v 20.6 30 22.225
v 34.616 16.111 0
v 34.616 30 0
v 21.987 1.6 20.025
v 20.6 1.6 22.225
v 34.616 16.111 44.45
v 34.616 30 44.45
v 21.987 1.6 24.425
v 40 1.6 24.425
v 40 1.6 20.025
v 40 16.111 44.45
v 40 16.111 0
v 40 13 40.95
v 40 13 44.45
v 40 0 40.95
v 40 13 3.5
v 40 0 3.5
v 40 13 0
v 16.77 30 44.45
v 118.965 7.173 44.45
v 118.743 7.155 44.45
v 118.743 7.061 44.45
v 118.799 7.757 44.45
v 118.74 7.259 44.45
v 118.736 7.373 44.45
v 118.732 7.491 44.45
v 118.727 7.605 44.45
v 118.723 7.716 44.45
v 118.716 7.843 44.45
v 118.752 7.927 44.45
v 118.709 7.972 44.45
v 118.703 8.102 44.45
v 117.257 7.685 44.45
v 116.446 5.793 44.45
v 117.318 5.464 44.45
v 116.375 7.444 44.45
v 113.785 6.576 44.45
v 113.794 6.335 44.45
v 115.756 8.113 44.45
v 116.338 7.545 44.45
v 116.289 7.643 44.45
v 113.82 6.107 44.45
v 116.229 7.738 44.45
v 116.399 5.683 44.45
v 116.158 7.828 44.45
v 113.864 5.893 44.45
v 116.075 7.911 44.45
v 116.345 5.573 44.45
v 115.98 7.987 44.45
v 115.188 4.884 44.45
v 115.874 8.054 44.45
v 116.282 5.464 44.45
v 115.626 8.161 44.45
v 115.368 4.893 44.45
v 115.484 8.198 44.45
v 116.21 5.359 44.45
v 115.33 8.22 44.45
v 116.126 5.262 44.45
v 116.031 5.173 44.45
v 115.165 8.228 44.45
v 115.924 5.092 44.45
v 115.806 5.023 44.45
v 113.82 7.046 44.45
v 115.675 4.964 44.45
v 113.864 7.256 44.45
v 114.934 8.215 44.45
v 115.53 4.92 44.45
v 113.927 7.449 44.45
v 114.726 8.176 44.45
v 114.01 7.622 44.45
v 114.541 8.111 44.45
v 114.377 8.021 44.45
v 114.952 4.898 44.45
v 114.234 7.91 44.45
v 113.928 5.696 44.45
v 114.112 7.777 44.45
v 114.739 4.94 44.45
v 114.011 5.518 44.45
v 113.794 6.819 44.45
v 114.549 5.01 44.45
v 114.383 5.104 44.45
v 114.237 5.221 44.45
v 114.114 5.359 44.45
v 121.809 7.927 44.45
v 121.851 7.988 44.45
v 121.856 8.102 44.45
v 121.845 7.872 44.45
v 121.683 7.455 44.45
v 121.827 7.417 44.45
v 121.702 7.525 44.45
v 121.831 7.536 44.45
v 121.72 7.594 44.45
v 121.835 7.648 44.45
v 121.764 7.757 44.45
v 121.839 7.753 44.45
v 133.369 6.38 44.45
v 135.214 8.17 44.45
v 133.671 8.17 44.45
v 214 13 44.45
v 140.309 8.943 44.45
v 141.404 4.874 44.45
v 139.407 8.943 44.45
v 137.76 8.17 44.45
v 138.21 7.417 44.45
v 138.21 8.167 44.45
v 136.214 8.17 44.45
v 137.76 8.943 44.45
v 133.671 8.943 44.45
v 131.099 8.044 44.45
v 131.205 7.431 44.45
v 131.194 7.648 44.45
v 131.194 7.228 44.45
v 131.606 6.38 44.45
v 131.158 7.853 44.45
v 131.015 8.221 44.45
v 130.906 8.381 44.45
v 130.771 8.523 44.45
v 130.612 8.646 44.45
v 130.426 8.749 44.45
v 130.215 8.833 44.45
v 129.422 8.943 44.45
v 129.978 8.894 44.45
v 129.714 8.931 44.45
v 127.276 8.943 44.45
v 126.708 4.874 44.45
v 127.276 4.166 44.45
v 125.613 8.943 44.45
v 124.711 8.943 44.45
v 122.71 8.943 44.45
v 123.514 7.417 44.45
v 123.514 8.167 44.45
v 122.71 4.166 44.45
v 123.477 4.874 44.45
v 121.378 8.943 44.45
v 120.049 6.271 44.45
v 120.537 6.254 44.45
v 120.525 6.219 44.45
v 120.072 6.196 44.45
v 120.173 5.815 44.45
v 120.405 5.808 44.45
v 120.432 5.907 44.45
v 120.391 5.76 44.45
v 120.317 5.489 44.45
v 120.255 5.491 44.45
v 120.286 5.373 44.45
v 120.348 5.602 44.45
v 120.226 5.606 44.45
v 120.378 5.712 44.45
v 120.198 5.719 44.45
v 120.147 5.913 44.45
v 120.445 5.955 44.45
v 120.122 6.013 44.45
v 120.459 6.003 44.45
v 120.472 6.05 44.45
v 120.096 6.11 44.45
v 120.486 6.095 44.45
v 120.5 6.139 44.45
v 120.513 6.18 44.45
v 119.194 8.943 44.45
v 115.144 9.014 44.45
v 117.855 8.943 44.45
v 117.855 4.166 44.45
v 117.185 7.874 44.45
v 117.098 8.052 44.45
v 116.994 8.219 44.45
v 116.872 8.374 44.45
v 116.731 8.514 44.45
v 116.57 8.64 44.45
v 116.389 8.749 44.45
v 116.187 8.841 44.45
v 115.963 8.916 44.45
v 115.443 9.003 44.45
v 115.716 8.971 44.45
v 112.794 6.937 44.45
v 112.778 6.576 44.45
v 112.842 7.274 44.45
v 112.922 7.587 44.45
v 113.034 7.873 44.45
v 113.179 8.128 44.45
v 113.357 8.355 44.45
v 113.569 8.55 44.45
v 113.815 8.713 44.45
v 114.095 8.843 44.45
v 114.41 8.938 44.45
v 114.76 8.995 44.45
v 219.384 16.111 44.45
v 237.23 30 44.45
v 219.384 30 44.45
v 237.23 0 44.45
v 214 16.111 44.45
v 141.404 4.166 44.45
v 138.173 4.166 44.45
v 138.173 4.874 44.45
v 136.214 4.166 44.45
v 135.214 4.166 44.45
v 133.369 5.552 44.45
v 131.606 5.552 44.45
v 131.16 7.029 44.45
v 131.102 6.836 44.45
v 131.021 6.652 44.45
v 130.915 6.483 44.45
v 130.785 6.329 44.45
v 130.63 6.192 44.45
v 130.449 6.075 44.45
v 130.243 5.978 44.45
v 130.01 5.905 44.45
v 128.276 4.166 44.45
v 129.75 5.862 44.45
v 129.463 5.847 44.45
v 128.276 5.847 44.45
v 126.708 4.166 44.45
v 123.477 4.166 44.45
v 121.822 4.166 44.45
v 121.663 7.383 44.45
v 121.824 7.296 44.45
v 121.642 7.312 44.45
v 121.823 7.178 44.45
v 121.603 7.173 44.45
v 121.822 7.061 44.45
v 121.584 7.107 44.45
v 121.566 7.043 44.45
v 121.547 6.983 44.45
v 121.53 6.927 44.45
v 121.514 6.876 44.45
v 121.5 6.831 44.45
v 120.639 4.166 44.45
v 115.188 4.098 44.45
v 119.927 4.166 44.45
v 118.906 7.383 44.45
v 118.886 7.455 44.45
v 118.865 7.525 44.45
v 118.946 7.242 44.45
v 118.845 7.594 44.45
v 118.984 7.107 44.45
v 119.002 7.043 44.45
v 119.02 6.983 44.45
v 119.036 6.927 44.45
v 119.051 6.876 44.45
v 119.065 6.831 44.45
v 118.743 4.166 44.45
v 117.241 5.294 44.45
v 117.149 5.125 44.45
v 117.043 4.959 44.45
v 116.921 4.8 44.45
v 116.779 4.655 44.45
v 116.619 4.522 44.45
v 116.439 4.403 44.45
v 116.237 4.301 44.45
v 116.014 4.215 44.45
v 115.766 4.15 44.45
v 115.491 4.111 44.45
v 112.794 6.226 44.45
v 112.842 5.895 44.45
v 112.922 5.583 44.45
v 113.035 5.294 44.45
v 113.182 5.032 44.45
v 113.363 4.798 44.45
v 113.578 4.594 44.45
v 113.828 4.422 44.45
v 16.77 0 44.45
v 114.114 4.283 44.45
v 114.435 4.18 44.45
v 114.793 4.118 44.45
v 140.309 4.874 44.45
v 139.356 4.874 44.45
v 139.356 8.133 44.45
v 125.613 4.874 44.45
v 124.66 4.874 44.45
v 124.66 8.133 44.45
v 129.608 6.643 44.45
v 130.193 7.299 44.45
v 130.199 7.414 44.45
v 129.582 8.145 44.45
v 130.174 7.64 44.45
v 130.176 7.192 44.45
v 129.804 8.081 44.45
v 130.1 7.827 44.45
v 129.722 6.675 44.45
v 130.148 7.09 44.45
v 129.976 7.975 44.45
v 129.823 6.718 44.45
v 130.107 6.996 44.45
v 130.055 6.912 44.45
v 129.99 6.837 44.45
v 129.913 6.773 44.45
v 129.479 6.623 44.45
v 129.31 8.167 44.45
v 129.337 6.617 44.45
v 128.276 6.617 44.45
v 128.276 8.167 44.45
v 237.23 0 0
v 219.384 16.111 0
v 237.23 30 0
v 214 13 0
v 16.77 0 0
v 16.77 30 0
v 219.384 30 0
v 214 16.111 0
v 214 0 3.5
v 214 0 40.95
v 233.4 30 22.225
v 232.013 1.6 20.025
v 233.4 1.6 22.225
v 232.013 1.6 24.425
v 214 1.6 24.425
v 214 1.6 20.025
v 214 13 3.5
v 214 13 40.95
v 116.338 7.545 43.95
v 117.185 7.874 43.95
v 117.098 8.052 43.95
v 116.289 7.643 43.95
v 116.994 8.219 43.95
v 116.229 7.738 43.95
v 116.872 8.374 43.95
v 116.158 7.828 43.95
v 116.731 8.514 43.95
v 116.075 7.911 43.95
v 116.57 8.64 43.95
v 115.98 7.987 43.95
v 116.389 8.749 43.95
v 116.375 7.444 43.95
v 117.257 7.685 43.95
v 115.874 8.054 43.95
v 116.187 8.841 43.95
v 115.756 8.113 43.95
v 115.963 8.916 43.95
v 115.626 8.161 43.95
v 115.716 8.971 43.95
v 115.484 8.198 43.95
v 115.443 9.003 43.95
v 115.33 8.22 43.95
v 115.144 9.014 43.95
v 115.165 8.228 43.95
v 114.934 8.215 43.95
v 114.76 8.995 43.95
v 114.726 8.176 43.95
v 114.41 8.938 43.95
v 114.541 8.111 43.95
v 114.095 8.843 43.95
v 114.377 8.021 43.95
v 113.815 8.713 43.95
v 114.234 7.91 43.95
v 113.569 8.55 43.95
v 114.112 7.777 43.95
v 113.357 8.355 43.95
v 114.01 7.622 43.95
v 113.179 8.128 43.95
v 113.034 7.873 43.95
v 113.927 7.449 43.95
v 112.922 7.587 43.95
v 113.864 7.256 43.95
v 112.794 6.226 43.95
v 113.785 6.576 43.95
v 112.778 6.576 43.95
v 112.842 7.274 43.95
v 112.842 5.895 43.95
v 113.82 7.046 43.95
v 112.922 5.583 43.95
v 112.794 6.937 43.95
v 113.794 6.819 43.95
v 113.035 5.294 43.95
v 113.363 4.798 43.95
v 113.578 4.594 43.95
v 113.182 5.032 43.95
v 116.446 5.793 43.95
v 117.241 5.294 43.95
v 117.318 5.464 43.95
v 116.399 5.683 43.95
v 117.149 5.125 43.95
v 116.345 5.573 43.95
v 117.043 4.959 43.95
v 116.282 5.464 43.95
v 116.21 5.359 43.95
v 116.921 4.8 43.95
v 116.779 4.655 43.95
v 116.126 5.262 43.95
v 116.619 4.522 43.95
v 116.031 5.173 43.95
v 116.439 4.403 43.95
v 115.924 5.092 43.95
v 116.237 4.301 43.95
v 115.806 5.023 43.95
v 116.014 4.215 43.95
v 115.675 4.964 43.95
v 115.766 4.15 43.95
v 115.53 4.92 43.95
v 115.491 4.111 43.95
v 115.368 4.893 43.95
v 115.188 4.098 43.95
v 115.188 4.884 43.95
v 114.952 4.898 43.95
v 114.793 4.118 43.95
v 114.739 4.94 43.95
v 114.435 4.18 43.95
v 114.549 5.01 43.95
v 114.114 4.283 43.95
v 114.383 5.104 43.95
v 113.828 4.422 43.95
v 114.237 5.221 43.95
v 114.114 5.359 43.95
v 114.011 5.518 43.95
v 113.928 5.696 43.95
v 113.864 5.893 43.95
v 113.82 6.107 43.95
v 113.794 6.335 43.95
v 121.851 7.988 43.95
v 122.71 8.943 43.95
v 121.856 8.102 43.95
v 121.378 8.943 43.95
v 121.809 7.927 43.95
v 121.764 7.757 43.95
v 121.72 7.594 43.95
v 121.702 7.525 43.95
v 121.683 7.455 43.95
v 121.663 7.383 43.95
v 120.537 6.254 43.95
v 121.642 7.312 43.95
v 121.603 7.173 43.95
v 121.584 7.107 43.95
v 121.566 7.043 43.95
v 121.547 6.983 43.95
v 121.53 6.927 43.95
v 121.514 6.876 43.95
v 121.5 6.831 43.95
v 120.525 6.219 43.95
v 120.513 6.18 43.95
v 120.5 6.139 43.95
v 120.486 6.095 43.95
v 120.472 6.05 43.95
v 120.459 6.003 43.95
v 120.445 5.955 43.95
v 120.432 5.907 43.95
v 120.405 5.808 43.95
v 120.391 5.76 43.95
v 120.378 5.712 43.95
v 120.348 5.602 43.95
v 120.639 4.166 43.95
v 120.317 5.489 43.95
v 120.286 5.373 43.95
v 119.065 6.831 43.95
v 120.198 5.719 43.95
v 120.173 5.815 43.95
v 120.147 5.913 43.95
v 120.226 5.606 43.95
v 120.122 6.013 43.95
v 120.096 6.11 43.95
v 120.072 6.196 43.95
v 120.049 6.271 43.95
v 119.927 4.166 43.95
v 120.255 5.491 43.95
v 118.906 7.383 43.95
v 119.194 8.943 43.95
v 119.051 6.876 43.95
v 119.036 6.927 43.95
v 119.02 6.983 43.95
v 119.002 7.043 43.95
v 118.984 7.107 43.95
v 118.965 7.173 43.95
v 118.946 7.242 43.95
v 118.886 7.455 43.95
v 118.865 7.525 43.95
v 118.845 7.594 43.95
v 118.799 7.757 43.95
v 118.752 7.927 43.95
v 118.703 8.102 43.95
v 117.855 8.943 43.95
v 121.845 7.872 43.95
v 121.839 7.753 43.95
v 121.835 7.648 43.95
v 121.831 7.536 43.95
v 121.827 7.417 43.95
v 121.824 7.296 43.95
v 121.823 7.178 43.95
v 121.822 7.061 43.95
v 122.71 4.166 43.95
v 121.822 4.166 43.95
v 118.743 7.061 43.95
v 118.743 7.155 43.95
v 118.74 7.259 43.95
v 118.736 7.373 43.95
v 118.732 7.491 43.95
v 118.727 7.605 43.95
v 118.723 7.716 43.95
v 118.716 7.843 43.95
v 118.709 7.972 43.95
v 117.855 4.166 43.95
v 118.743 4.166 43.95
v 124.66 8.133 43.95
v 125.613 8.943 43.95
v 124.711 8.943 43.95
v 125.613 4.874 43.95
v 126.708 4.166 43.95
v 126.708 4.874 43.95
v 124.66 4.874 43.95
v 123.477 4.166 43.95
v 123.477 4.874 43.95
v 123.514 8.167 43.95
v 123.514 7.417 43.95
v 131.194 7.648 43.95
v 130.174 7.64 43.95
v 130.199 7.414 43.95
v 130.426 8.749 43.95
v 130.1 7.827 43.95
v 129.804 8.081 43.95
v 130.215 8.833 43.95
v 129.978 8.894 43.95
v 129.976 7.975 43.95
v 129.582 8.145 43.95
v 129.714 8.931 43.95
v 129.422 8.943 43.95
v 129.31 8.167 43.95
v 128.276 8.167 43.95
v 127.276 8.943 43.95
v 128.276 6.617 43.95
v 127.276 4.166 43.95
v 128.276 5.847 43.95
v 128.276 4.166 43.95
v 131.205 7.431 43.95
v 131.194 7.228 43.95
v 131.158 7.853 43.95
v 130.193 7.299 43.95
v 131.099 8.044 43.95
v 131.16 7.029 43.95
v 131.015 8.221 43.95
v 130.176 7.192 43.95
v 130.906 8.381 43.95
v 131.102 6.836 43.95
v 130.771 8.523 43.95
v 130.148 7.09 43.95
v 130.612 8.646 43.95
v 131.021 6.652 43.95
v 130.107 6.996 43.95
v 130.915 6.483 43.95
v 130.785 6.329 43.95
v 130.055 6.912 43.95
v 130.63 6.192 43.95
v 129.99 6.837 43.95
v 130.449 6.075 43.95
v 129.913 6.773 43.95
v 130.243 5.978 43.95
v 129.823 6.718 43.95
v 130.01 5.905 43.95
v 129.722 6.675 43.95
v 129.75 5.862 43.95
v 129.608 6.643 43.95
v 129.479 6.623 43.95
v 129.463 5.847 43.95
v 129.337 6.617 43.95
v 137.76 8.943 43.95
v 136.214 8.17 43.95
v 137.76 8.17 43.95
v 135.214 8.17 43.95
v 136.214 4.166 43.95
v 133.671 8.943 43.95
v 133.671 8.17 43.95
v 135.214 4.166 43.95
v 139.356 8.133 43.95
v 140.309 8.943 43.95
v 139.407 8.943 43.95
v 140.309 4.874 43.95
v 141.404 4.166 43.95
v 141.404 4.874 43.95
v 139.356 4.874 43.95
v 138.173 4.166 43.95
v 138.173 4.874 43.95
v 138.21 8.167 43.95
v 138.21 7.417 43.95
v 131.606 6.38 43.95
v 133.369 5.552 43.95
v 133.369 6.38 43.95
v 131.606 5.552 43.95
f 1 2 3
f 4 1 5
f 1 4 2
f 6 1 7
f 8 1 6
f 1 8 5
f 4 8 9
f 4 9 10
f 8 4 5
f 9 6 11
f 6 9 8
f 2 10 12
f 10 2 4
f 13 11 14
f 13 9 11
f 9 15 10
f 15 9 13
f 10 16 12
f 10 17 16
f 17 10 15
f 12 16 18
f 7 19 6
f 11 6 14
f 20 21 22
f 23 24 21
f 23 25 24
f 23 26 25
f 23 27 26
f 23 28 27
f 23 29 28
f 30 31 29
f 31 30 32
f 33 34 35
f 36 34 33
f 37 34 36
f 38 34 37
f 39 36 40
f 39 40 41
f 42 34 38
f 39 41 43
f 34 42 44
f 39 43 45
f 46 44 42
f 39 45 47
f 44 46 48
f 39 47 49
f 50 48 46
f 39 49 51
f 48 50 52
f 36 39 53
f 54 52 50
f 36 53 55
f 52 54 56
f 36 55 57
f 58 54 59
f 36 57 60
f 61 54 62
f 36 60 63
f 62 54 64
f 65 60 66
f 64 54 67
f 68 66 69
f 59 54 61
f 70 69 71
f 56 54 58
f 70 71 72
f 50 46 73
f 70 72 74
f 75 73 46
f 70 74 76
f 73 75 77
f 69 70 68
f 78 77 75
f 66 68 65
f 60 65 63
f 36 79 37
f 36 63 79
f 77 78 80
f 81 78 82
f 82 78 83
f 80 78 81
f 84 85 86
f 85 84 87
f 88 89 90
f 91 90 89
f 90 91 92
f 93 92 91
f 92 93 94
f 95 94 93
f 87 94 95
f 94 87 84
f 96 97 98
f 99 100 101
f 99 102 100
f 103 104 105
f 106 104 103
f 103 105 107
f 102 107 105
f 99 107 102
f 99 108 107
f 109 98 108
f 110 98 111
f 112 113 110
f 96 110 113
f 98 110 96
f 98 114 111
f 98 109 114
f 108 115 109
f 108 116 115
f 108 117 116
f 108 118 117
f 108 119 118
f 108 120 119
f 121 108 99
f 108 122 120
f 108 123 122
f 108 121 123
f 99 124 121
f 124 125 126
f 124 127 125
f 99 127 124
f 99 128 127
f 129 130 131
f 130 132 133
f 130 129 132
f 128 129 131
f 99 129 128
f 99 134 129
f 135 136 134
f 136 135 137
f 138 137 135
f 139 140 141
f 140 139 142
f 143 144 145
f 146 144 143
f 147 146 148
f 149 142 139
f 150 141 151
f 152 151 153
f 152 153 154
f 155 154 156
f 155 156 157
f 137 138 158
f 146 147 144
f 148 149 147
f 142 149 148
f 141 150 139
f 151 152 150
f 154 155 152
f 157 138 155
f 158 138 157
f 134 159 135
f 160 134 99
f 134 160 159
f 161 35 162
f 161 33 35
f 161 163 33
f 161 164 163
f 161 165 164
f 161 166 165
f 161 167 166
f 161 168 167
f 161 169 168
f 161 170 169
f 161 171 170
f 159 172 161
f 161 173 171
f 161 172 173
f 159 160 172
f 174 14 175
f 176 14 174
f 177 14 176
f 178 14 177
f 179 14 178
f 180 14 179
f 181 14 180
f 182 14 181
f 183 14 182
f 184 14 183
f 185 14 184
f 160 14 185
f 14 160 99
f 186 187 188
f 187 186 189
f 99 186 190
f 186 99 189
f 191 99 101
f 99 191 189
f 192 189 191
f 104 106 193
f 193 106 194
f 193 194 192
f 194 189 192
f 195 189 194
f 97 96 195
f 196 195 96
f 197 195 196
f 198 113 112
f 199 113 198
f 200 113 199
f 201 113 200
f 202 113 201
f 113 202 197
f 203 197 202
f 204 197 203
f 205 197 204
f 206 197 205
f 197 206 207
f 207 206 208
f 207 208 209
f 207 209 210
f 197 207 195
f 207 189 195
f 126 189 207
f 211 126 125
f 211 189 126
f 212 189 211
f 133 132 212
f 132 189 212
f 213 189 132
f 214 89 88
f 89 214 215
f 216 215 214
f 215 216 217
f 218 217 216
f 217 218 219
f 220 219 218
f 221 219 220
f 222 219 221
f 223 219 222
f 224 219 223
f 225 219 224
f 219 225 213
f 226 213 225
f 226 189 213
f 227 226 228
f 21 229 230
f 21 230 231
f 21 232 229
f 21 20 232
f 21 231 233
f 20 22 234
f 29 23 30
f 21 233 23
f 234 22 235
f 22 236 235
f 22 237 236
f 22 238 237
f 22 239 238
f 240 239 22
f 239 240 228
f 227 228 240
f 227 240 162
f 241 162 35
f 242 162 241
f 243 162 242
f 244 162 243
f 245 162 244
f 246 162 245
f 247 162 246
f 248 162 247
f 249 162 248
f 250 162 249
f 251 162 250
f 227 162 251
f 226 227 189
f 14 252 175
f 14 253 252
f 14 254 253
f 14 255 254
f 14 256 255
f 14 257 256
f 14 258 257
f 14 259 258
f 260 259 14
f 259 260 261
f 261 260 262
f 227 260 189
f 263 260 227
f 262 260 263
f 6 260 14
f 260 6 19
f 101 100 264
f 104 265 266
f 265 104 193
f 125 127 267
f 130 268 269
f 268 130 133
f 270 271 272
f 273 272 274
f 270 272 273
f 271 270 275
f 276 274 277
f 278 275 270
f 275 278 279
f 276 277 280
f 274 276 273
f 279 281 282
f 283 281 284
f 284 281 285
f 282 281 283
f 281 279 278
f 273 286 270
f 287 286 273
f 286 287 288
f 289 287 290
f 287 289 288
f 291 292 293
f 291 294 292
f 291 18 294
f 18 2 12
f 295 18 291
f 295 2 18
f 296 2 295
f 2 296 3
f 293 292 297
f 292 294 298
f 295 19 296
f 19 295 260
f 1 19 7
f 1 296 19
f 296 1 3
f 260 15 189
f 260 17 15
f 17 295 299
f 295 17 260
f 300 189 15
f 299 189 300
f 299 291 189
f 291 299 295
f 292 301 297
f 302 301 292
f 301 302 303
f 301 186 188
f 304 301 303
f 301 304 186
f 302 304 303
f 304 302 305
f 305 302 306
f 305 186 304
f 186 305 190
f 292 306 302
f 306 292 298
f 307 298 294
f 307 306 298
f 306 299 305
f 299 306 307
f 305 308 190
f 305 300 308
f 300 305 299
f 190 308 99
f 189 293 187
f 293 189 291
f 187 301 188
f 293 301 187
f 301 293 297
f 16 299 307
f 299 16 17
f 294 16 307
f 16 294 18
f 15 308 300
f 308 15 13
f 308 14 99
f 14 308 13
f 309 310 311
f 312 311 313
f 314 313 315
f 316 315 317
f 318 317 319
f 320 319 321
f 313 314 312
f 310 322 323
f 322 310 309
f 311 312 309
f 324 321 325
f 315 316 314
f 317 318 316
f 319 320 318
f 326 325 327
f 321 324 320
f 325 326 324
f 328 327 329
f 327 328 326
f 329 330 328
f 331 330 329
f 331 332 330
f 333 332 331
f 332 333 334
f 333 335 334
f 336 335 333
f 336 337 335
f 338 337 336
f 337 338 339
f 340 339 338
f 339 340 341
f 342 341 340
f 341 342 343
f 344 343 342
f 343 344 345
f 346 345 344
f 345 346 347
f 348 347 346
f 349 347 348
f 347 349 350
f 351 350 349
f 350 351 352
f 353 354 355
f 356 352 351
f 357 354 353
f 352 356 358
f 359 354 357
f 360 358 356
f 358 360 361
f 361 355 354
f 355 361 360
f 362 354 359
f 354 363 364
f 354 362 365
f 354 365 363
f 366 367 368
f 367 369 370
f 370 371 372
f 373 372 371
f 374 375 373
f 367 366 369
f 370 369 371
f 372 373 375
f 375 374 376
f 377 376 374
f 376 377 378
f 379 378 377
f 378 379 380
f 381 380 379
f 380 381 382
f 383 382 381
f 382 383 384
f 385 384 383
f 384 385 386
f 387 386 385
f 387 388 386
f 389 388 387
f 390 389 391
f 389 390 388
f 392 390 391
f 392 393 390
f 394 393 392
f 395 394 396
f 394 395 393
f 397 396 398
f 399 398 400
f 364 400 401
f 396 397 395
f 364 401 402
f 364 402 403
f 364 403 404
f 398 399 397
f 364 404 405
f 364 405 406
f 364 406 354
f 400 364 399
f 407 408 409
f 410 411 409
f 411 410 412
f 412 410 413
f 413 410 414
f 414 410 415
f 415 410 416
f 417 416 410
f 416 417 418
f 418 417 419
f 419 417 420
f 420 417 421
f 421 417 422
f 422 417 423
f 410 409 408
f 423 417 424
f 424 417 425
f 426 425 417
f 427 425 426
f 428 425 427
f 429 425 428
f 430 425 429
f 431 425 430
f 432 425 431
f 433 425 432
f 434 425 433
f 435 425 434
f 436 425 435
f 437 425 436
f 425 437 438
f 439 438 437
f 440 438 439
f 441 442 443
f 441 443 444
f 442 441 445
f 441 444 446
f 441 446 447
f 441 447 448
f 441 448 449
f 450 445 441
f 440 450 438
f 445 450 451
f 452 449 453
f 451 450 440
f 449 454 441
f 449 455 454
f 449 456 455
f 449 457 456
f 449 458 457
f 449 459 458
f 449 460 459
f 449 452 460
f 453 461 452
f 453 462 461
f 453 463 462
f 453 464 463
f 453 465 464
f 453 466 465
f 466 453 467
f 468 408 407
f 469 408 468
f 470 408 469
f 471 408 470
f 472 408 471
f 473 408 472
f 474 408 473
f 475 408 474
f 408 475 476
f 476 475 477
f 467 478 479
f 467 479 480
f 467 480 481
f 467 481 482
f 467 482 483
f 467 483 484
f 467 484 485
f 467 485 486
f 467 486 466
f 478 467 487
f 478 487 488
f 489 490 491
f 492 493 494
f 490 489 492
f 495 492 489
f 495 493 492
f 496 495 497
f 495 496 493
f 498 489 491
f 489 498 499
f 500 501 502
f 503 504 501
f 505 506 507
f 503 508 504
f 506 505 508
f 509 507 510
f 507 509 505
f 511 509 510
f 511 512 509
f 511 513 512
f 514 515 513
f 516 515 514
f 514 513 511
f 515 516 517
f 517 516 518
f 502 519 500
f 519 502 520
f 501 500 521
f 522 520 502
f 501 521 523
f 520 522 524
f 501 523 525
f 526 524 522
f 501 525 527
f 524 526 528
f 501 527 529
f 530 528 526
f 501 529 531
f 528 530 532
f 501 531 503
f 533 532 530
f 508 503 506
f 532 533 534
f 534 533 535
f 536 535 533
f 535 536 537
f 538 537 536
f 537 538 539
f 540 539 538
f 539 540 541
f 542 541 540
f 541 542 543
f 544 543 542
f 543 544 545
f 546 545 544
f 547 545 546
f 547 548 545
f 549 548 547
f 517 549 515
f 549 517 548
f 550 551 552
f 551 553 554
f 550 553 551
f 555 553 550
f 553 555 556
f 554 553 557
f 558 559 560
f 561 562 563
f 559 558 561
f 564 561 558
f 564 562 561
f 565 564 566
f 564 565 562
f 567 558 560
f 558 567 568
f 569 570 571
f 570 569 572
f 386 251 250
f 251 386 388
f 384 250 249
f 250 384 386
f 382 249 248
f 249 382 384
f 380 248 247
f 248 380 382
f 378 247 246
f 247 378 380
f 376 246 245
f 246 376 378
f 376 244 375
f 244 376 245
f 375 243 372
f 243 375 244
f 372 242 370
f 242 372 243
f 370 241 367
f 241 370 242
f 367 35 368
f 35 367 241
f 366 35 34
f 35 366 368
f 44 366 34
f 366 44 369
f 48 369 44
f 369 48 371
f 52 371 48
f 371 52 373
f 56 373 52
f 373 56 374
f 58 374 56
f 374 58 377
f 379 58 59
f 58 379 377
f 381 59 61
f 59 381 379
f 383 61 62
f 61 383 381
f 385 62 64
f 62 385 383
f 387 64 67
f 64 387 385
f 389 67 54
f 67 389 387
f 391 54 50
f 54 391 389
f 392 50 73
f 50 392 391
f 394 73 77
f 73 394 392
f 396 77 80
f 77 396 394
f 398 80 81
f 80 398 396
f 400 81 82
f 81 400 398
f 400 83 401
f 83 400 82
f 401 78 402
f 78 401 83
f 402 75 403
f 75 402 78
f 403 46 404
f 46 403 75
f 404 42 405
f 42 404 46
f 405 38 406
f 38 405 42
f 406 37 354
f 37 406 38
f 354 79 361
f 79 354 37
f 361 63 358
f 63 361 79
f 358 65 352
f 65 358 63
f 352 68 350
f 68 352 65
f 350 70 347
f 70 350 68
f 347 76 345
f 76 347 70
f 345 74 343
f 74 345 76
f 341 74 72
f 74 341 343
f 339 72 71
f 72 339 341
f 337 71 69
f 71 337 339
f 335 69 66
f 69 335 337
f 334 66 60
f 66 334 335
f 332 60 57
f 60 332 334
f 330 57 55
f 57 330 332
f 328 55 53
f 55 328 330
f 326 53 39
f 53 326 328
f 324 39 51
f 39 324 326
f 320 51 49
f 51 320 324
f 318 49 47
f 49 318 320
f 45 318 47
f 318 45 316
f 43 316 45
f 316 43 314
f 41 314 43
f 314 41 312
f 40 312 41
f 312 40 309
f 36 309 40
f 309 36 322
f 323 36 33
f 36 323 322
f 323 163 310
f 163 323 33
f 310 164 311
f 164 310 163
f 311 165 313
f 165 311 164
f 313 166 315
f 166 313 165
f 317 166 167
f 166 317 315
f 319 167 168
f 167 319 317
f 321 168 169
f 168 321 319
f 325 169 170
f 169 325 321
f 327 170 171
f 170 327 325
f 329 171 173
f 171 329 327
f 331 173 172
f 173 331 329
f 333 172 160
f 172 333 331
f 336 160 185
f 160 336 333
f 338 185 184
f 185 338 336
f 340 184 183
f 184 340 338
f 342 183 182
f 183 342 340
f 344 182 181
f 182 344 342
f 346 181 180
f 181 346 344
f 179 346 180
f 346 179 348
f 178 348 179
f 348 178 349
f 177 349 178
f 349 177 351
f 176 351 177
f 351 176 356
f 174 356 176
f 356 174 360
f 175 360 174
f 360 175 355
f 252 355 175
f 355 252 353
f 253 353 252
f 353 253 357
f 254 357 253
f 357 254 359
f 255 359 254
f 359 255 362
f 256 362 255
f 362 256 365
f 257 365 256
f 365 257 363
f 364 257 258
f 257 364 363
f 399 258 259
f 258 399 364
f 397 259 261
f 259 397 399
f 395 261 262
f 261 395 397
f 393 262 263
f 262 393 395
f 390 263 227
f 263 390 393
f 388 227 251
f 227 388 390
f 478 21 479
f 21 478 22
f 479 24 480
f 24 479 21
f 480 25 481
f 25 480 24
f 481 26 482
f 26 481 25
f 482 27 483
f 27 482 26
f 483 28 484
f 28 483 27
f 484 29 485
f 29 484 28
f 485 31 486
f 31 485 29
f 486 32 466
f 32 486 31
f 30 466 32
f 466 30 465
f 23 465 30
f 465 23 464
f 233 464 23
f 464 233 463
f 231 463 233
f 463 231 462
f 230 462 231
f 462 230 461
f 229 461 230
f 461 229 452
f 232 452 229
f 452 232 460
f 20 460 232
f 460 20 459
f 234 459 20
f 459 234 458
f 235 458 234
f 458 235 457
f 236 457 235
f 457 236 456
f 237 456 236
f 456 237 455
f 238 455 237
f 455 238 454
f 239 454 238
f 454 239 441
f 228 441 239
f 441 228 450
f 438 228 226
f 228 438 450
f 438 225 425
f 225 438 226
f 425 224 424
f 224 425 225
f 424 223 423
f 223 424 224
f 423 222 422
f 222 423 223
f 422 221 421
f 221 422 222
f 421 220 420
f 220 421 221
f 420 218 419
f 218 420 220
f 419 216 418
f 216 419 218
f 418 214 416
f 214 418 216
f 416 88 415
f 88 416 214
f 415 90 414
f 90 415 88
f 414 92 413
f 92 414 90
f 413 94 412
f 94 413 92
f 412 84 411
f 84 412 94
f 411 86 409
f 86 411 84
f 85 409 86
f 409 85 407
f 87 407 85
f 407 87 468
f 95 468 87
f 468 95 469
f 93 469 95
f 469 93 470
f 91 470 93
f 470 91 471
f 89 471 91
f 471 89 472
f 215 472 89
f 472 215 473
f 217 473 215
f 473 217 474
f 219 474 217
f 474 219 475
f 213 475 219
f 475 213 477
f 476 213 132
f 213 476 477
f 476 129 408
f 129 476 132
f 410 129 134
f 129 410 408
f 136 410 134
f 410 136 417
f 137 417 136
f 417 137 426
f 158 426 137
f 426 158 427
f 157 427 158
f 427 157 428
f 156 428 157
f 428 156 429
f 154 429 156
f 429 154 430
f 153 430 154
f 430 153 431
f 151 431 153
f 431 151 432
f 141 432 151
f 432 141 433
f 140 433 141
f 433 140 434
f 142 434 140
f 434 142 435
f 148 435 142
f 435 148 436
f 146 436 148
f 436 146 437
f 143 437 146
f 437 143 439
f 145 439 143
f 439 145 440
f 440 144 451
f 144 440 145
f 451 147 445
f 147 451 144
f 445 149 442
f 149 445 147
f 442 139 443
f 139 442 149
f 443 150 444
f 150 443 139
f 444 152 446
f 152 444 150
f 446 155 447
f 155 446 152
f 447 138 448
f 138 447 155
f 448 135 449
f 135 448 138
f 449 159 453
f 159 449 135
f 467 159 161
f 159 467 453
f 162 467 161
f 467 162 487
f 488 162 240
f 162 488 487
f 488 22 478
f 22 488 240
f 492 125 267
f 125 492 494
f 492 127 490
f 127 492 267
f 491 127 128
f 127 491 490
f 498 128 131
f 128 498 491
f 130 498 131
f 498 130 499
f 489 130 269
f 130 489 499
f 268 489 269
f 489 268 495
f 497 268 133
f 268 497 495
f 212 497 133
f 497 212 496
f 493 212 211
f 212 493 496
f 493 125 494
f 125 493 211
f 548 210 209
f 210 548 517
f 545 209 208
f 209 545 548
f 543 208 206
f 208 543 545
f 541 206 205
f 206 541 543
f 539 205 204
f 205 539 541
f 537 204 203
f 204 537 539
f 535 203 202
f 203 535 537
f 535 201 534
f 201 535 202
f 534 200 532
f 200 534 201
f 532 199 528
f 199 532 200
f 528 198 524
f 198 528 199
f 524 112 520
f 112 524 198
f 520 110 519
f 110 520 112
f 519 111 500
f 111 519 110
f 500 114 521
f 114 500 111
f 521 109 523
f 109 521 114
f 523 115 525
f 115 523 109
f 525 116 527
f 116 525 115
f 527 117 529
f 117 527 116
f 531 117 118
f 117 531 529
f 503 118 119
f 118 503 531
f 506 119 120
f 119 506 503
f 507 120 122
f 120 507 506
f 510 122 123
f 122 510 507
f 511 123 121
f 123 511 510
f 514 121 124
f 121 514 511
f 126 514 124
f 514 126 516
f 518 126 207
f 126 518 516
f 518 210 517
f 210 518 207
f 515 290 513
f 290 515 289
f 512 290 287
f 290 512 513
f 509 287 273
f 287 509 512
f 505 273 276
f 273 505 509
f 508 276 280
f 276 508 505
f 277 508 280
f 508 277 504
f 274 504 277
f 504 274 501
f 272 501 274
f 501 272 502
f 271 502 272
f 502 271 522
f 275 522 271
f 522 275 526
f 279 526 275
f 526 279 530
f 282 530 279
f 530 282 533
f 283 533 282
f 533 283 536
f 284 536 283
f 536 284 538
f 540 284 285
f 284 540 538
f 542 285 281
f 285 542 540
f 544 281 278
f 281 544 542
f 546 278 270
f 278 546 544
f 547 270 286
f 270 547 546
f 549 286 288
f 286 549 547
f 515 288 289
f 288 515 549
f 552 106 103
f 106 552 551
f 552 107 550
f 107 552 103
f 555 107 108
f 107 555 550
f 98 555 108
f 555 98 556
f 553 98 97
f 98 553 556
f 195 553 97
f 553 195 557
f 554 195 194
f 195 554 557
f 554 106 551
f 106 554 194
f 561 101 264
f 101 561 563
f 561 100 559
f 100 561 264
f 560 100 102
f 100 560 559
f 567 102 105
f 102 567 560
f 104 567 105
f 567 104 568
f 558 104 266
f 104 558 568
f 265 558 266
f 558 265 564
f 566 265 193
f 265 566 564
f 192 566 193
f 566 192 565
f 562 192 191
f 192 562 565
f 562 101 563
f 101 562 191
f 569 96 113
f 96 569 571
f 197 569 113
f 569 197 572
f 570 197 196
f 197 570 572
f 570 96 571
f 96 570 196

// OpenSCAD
// CM1P-T1: test slice for the one-piece CM1000 bracket. Press it onto the front of the modem from behind.
// Same pocket and channels as the planned one-piece part, at true spacing, only the ends plus two tie strips.
// Brian measured (2026-11-01): 212 tip to tip, 44.4 tall, 14 end wedge, 3 tall at the very front, 44.4 at 15 back, 136 deep.
// Assumed: end tip pointed and centred; nose a straight taper reaching full height 15 back.
// Frame: X across (254 plate), Y depth (plate front Y=0), Z height (0..44.45).
id = "CM1P-T1";

plate_h = 44.45;
mid = plate_h / 2;
rail_x = 16.77;            // outer face of the rails, unchanged: 220.46 across
block_x = 40;              // end blocks stop here
depth = 30;                // 14 of channel behind the pocket rim

// channel: x = tip_x + slope * |z - mid|
gap_x = 0.4;               // clearance across the width
tip_x = 127 - 212 / 2 - gap_x;
slope = 14 / 22.2;
over = 23.5;

// pocket: half height vs Y, modem nose + clearance
nose_k = (22.2 - 1.5) / 15;
floor_y = 1.6;             // front wall
floor_h = 2.2;             // modem front face half height 1.5 + 0.7 clearance
far_y = 20;

strip_h = 3.5;             // ties: along the outer faces, from the bed up, in the taper's spare room
strip_y = 13;

module channel(y0, y1)
    translate([0, y1, 0]) rotate([90, 0, 0]) linear_extrude(y1 - y0)
        polygon([[tip_x, mid], [tip_x + slope * over, mid + over], [block_x + 5, mid + over], [block_x + 5, mid - over], [tip_x + slope * over, mid - over]]);
module pocket_cut() intersection() {
    channel(floor_y, depth + 1);
    h = floor_h + nose_k * (far_y - floor_y);
    translate([0, 0, 0]) rotate([90, 0, 90]) linear_extrude(block_x + 6)
        polygon([[floor_y, mid - floor_h], [floor_y, mid + floor_h], [far_y, mid + h], [depth + 2, mid + h], [depth + 2, mid - h], [far_y, mid - h]]);
}
module end_block() difference() {
    translate([rail_x, 0, 0]) cube([block_x - rail_x, depth, plate_h]);
    pocket_cut();
}
module strip(z) translate([rail_x, 0, z]) cube([254 - 2 * rail_x, strip_y, strip_h]);

difference() {
    union() {
        end_block();
        translate([254, 0, 0]) mirror([1, 0, 0]) end_block();
        strip(0);
        strip(plate_h - strip_h);
    }
    translate([127, strip_y / 2, plate_h - 0.5]) linear_extrude(1)
        text(id, size = 5, font = "Liberation Sans:style=Bold", halign = "center", valign = "center");
}
